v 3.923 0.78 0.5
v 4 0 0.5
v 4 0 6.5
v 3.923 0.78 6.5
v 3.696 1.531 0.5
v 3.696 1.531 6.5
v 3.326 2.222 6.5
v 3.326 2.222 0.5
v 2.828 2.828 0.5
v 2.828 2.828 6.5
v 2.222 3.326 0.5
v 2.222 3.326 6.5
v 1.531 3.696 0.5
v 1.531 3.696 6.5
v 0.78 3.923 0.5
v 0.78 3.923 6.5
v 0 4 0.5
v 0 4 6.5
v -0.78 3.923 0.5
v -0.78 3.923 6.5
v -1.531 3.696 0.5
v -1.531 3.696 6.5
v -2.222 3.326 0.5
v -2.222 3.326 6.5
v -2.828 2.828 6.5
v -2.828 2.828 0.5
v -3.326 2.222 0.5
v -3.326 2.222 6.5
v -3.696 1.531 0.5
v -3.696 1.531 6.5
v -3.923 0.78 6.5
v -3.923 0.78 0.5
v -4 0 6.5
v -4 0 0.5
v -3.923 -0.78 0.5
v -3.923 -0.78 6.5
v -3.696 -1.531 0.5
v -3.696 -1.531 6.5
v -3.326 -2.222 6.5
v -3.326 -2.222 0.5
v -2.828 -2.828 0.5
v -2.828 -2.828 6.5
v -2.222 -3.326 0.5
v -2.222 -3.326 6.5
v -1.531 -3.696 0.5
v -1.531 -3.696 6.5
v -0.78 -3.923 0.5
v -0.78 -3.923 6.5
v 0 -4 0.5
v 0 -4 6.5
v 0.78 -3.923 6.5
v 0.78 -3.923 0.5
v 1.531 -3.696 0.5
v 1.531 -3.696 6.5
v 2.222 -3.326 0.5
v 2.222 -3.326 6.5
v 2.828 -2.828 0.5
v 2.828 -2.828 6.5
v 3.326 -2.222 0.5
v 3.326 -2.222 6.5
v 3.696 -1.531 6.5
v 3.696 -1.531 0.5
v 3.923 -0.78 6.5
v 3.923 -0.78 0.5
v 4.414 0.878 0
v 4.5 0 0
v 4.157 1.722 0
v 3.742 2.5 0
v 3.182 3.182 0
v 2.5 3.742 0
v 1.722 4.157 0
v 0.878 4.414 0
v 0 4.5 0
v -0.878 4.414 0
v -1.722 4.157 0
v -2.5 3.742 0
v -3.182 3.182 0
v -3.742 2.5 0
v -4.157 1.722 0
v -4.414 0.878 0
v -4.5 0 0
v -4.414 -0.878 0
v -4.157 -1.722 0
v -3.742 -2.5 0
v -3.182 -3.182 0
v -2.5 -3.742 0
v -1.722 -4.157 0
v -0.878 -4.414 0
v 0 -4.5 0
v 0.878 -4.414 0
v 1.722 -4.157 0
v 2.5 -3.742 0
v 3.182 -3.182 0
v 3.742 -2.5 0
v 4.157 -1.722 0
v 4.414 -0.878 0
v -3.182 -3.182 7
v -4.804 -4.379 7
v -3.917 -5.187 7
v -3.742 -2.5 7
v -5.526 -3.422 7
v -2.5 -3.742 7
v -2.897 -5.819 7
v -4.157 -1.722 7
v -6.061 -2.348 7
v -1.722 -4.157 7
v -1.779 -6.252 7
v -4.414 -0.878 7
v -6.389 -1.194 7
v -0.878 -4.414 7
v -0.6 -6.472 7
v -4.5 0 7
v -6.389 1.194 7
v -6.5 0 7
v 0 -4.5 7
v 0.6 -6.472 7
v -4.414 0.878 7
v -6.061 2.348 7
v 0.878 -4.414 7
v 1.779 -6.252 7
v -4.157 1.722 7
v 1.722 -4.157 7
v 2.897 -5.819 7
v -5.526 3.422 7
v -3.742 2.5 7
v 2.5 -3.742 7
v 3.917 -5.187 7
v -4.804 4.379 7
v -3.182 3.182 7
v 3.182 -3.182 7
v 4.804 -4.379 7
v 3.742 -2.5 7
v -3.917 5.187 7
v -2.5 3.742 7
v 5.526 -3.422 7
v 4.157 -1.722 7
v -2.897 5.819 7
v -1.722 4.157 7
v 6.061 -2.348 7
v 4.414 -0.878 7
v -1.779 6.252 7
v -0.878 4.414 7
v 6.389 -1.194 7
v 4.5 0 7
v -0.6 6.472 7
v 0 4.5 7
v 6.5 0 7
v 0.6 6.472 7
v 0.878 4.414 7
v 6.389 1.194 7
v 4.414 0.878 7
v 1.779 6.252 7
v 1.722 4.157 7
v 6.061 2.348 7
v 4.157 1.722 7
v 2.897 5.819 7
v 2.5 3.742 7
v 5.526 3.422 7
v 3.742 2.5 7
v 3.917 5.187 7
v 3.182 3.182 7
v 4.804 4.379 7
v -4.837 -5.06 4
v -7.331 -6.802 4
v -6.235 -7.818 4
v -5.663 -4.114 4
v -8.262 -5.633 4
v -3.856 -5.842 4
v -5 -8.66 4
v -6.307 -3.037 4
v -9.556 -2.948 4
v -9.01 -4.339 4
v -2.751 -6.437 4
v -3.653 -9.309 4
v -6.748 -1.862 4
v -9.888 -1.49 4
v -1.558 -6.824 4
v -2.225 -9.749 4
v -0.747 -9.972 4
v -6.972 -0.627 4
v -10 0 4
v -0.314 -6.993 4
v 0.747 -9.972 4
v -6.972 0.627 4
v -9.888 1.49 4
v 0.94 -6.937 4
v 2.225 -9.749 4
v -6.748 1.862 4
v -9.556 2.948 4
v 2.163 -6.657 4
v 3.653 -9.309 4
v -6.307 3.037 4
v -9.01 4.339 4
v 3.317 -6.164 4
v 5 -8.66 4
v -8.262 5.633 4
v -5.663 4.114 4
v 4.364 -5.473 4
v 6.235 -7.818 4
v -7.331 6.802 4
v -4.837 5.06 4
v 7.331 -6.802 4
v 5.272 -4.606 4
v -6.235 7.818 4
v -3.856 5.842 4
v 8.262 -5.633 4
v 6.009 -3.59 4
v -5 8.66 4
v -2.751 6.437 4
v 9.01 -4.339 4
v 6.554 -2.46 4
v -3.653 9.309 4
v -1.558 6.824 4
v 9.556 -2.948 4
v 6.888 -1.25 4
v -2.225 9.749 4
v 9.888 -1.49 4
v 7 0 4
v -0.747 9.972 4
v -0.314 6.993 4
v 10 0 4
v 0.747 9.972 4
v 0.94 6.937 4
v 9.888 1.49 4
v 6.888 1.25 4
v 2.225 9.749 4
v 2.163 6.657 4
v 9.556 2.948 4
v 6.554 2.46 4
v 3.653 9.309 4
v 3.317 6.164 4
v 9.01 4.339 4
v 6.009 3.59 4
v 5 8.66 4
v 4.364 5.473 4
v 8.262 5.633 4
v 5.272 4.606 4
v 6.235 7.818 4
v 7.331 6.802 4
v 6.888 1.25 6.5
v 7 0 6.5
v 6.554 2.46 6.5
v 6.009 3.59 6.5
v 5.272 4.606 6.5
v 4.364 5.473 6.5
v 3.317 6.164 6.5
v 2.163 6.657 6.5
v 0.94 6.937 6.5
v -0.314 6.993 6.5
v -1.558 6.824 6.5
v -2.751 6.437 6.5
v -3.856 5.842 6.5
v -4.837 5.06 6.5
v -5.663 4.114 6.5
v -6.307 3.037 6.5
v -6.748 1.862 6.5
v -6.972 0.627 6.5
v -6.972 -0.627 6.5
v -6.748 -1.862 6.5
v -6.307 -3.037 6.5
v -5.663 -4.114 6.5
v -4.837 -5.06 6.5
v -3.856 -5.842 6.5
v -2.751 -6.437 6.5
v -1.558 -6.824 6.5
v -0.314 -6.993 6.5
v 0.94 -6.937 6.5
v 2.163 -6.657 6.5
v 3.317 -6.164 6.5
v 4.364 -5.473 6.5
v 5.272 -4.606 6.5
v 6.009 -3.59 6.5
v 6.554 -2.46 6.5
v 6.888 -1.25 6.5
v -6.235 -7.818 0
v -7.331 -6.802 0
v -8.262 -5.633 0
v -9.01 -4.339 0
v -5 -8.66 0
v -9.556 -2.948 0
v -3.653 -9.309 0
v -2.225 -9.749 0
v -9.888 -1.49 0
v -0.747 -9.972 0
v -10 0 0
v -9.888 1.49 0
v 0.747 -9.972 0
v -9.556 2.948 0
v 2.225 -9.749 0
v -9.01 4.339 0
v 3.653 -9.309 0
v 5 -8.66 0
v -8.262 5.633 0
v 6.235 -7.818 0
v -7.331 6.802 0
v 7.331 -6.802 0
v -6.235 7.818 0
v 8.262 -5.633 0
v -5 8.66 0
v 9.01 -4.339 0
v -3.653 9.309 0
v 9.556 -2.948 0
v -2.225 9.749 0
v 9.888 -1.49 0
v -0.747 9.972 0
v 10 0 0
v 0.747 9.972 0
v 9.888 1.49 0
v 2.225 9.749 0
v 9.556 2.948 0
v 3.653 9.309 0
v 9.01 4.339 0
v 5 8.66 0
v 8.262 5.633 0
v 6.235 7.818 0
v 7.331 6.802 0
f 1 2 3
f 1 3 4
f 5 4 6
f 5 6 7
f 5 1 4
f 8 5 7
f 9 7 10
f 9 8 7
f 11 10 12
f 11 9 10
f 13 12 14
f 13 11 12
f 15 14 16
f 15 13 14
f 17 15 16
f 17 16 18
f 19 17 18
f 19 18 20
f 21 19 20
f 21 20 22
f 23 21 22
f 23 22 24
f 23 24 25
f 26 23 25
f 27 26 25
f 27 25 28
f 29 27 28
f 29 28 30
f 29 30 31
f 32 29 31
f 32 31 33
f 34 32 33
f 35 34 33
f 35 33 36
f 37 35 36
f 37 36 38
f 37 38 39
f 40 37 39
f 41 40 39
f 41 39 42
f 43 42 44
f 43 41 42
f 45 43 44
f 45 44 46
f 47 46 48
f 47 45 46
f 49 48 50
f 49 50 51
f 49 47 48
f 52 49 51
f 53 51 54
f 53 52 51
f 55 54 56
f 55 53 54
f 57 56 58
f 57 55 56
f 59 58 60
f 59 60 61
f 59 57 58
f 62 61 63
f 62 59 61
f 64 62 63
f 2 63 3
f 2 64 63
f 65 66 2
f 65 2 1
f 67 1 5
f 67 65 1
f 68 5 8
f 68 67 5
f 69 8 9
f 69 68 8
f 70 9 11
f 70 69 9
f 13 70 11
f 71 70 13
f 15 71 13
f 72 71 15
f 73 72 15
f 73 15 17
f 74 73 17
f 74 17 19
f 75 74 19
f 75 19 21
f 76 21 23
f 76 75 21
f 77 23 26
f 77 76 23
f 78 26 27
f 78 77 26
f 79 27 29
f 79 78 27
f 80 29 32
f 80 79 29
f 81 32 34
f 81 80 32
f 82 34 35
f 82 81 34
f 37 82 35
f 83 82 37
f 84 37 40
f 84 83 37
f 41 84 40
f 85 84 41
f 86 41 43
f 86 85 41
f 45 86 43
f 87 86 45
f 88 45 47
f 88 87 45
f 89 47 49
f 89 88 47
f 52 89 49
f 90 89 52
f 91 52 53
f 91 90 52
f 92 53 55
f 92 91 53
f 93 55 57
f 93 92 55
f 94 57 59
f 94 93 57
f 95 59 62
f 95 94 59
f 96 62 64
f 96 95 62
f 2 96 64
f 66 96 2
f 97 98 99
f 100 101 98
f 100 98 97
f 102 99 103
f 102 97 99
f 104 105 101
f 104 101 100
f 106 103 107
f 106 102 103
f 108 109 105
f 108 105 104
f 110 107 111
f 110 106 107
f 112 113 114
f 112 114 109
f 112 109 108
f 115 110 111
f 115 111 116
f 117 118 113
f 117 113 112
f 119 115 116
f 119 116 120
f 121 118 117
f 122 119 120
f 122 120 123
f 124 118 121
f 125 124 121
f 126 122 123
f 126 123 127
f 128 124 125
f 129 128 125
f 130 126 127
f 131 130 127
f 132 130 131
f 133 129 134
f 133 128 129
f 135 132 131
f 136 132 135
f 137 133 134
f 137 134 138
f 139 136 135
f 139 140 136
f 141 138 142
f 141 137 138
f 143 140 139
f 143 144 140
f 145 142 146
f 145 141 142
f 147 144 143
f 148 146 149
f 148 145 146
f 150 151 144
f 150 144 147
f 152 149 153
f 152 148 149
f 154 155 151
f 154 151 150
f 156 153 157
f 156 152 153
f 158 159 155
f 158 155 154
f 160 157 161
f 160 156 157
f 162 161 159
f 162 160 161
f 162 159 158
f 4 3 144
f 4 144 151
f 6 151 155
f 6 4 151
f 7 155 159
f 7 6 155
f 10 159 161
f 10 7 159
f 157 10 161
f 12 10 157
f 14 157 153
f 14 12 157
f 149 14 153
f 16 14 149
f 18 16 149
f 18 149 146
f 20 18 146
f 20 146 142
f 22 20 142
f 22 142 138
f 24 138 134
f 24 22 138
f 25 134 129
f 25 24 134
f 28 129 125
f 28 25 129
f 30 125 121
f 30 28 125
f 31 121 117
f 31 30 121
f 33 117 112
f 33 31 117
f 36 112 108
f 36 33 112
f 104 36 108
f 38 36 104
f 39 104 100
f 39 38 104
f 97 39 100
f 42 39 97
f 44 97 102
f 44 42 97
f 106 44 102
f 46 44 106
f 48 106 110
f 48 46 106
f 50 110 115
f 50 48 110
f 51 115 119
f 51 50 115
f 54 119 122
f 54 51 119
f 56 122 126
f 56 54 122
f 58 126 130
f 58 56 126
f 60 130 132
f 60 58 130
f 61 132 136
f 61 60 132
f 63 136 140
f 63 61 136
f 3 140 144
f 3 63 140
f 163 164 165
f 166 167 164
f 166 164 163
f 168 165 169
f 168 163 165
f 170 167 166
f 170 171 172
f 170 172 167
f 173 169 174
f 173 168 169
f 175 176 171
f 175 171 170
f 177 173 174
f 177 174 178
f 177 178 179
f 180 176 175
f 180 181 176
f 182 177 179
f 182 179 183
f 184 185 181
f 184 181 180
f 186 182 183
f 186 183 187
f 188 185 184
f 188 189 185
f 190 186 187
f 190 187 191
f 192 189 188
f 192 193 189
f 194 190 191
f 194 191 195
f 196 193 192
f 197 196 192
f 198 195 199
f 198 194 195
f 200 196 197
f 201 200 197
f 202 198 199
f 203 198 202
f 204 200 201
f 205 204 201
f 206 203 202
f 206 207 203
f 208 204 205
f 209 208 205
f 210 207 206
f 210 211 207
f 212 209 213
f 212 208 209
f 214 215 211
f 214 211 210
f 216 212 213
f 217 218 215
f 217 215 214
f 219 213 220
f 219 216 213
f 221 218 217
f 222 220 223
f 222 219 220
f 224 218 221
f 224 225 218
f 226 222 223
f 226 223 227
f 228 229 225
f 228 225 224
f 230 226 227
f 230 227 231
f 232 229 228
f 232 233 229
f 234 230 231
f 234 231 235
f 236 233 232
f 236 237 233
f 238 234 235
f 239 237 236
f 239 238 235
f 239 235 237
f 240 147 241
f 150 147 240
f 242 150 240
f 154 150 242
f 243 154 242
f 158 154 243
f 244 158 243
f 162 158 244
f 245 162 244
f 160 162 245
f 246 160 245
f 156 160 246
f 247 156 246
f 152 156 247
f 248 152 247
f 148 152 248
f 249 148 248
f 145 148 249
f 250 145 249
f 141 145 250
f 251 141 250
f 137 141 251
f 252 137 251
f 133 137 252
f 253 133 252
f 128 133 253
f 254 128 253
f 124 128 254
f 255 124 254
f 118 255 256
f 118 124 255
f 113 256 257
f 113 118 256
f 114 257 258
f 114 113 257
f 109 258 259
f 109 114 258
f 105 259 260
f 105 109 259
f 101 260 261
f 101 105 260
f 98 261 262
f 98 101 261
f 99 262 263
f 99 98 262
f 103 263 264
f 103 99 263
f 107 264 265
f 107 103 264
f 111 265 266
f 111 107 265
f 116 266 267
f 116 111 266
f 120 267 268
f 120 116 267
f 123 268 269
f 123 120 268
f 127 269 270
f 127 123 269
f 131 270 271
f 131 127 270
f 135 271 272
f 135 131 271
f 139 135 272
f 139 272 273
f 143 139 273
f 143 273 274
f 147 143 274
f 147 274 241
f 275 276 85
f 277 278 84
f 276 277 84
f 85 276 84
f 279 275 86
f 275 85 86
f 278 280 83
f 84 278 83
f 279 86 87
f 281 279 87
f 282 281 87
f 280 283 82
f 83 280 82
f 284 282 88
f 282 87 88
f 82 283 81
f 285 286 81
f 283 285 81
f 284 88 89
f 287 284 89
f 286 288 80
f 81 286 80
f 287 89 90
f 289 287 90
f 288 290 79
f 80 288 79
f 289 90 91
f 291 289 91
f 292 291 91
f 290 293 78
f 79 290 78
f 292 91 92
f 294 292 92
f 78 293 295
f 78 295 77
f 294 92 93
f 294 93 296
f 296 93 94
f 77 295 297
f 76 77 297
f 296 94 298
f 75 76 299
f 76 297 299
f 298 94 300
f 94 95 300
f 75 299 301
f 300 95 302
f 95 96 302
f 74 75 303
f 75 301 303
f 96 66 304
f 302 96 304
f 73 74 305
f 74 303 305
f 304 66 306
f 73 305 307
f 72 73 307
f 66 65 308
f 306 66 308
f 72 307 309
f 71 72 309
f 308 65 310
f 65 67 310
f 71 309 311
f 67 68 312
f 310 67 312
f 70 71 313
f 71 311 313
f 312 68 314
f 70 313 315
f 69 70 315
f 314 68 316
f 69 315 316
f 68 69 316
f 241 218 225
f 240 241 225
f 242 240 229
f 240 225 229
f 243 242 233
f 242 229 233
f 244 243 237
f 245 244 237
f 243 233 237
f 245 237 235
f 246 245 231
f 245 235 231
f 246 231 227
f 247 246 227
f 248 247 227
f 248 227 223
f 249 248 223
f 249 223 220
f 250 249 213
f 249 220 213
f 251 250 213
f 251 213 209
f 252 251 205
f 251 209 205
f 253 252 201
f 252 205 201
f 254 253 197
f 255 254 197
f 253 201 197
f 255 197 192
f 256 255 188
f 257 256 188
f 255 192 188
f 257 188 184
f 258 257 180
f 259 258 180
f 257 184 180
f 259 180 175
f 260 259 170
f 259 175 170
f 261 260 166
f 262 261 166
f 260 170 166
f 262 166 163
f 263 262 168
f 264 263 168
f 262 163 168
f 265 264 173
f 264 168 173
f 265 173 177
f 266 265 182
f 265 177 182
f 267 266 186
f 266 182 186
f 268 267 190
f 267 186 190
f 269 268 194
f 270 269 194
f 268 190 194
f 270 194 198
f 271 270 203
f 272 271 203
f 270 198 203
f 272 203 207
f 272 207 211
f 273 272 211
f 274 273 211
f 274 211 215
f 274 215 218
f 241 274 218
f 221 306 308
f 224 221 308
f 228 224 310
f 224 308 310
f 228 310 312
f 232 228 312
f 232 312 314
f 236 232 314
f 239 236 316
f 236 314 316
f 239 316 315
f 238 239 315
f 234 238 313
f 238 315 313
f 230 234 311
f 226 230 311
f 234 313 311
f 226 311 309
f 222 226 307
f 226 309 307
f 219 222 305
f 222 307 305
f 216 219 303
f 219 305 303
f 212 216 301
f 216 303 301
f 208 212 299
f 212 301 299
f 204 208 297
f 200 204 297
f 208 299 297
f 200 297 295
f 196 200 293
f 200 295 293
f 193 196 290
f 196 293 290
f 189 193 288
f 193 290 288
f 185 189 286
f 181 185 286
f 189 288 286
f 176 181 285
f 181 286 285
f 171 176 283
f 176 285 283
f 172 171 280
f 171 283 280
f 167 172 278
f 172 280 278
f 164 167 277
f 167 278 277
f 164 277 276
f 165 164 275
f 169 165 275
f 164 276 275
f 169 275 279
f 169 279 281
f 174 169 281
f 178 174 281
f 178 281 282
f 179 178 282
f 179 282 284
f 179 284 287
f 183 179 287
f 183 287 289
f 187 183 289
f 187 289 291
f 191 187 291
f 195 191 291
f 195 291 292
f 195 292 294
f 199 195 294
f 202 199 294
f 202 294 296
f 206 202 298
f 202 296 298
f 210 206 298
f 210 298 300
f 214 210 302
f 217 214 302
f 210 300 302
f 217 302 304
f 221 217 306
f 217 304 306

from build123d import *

# Parameters (mm, degrees)
ESQUISSE1_R          = 10
ESQUISSE1_R_2        = 4
BASE_EXTRUSION_DEPTH = 4
ESQUISSE2_R          = 7
ESQUISSE2_R_2        = 4
BOSS_EXTRU_1_DEPTH   = 3
CHANFREIN3_SIZE      = 0.5


with BuildPart() as part:
    # Esquisse1 → Base-Extrusion (new body)
    with BuildSketch(Plane.XY):
        Circle(ESQUISSE1_R)
        Circle(ESQUISSE1_R_2, mode=Mode.SUBTRACT)
    extrude(amount=BASE_EXTRUSION_DEPTH)

    # Esquisse2 → Boss.-Extru.1 (add)
    with BuildSketch(Plane.XY.offset(4)):
        Circle(ESQUISSE2_R)
        Circle(ESQUISSE2_R_2, mode=Mode.SUBTRACT)
    extrude(amount=BOSS_EXTRU_1_DEPTH)

    # Chanfrein3
    chanfrein3_edges = [part.edges().sort_by_distance(p)[0] for p in [
        (-7, 0, 7),
        (-4, 0, 7),
        (-4, 0, 0),
    ]]
    chamfer(chanfrein3_edges, length=CHANFREIN3_SIZE)


solid = part.part
